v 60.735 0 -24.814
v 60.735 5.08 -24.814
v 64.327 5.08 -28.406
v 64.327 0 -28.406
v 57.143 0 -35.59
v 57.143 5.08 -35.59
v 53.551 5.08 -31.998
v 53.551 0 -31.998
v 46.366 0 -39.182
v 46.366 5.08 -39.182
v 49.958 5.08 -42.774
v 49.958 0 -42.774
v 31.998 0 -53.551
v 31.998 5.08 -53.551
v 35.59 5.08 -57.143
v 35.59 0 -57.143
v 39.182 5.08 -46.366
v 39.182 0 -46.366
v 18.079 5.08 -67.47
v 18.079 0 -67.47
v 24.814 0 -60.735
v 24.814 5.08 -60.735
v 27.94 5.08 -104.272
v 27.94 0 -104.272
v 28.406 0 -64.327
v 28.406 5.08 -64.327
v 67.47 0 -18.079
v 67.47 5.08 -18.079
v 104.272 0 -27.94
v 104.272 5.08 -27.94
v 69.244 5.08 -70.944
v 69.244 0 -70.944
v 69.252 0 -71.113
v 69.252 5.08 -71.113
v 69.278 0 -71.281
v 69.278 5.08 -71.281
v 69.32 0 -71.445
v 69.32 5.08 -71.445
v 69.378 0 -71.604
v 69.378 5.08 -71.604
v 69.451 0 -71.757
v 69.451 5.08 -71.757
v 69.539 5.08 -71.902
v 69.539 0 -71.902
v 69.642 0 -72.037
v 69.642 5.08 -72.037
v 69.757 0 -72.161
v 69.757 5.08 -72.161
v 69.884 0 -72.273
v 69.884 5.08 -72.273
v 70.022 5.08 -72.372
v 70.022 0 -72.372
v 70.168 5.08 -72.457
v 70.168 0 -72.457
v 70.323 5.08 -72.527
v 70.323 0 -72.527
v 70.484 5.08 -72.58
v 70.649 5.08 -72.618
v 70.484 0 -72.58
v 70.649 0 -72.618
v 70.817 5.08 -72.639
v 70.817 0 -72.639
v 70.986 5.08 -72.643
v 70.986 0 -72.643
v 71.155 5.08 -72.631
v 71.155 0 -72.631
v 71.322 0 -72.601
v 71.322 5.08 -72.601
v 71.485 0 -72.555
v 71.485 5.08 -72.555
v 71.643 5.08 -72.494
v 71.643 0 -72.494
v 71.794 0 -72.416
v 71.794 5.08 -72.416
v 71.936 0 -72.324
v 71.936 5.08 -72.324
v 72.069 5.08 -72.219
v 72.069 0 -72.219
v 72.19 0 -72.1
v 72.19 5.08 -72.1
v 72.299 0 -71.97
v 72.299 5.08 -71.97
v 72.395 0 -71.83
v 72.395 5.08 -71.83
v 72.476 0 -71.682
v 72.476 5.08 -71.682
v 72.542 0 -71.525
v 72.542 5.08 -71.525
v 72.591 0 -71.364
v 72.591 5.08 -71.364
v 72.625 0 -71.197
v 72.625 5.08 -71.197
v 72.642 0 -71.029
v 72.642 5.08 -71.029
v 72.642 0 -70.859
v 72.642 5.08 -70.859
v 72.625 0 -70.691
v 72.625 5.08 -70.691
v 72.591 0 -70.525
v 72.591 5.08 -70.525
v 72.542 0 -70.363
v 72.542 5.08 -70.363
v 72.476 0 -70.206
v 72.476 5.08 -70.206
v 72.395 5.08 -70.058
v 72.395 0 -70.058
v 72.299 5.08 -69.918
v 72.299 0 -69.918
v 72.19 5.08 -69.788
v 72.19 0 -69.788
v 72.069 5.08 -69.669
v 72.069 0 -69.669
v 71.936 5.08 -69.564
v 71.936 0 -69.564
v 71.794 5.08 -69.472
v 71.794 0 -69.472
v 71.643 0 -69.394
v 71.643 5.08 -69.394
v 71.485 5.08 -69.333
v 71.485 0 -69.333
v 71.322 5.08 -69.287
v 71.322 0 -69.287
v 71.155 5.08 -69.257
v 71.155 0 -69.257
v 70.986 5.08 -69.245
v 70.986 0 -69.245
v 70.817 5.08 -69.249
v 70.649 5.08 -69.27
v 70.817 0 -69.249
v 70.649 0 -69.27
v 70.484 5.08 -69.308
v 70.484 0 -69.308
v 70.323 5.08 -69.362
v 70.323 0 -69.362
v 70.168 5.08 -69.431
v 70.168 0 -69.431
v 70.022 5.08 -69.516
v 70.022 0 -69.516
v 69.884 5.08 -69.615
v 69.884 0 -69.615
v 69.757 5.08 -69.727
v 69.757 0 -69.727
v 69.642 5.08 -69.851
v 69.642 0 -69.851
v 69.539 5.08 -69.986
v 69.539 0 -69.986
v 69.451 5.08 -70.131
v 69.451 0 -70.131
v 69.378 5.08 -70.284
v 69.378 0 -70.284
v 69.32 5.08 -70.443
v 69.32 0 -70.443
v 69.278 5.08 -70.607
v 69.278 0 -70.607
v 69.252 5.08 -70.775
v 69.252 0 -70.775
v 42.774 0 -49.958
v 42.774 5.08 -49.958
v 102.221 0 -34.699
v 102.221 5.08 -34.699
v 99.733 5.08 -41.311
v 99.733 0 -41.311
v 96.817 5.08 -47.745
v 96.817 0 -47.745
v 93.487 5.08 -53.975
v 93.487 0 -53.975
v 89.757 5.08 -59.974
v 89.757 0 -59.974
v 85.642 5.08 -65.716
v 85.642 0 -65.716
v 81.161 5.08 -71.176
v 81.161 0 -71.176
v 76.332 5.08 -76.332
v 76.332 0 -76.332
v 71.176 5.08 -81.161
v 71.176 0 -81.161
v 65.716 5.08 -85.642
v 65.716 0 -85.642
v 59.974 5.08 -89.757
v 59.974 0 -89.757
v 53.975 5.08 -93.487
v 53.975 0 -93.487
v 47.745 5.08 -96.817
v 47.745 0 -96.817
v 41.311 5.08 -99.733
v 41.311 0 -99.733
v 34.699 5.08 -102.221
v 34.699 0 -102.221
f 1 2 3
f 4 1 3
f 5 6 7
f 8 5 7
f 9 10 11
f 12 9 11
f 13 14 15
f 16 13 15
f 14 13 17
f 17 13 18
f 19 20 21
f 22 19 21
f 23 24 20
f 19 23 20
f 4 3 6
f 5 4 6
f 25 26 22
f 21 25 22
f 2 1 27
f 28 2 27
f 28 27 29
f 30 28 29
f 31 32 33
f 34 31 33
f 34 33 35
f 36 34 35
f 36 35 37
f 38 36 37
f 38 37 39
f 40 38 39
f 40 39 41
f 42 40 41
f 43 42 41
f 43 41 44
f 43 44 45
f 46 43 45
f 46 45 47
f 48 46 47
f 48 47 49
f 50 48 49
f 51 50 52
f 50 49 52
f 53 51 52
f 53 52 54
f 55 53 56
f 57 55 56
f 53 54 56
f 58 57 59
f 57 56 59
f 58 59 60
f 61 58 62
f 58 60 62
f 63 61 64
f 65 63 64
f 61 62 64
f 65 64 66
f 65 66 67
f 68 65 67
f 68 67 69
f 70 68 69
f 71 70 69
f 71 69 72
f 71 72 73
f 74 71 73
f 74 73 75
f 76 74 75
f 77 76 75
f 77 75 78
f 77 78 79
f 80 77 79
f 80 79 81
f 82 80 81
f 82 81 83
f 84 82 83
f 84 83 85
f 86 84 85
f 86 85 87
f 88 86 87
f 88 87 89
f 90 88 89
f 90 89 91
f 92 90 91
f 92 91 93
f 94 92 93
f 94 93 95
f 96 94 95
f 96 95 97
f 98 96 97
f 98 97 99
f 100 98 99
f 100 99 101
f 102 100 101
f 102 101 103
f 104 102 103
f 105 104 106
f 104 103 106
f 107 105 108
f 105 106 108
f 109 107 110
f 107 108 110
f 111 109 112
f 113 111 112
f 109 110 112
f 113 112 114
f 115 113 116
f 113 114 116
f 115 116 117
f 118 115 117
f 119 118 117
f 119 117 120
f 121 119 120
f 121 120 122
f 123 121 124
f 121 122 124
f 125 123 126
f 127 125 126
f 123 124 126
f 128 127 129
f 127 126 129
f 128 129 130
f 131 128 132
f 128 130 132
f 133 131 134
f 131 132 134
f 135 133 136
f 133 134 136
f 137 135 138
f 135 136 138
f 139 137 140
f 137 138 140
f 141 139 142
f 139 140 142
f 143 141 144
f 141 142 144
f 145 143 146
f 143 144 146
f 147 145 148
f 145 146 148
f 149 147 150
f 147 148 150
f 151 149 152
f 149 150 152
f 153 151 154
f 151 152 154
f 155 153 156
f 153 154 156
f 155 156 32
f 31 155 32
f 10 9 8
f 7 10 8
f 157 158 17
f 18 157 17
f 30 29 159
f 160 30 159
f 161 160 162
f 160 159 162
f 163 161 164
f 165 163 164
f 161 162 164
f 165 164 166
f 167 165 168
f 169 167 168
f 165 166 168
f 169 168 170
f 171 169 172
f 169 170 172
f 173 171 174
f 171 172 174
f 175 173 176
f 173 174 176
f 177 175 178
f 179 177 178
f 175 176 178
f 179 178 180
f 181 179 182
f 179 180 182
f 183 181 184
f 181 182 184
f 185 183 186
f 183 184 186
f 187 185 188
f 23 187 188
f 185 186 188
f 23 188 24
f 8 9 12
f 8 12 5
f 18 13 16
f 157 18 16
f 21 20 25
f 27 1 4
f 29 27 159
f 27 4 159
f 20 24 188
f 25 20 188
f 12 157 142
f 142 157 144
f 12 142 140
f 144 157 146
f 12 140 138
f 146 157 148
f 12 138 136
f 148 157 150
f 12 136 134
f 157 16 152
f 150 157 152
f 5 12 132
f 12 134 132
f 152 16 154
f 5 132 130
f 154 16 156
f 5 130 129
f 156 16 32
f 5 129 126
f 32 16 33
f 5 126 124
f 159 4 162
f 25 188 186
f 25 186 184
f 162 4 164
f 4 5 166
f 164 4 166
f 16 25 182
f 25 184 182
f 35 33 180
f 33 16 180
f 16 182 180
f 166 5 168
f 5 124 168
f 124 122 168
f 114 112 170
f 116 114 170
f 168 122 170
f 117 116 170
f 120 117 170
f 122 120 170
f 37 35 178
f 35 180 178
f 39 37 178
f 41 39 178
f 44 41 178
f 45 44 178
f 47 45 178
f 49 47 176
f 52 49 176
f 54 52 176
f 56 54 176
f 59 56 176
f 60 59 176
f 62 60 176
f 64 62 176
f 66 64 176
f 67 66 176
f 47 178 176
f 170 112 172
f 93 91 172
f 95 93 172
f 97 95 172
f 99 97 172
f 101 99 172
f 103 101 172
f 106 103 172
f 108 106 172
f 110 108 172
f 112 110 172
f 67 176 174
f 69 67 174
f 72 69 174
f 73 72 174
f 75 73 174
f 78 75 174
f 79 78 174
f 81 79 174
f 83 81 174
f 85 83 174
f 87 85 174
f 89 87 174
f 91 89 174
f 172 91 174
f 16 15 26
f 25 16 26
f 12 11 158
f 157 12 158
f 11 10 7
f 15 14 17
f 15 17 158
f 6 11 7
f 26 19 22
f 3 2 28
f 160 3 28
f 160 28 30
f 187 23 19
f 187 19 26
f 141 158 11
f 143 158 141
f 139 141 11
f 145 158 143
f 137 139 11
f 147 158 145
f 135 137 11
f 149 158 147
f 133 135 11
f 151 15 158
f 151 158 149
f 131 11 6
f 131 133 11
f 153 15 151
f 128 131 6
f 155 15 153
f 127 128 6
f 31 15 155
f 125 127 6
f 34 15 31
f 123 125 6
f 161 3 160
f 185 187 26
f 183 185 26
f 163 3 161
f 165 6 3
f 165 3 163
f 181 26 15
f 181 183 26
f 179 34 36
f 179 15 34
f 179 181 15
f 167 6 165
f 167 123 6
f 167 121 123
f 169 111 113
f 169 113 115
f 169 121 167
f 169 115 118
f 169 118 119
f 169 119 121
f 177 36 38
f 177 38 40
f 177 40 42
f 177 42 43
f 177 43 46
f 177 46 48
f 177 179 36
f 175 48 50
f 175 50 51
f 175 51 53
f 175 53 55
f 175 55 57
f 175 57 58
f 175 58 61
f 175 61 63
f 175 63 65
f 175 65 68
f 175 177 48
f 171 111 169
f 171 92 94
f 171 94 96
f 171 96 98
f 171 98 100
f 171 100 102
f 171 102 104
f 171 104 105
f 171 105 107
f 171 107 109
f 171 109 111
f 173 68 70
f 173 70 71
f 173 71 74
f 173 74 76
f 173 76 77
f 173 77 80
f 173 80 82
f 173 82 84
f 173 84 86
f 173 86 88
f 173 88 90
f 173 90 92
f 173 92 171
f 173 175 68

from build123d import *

# Parameters (mm, degrees)
BOSS_EXTRUDE1_DEPTH      = 5.08
M3_CLEARANCE_HOLE1_D     = 3.4
M3_CLEARANCE_HOLE1_DEPTH = 11.938
M3_CLEARANCE_HOLE1_TIP   = 1.021463052
CUT_EXTRUDE1_REACH       = 7.08


with BuildPart() as part:
    # Sketch1 → Boss-Extrude1 (new body)
    with BuildSketch(Plane(origin=(0, 0, 0), x_dir=(1, 0, 0), z_dir=(0, 1, 0))):
        with BuildLine():
            Line((27.939515919, 104.271692948), (18.0785103, 67.469918966))
            Line((18.0785103, 67.469918966), (67.469918966, 18.0785103))
            Line((67.469918966, 18.0785103), (104.271692948, 27.939515919))
            ThreePointArc((104.271692948, 27.939515919), (76.332177029, 76.332177029), (27.939515919, 104.271692948))
        make_face()
    extrude(amount=BOSS_EXTRUDE1_DEPTH)

    # M3 Clearance Hole1
    with Locations(Plane(origin=(0, 5.08, 0), x_dir=(1, 0, 0), z_dir=(0, 1, 0))):
        with Locations((70.944023356, 70.944023356)):
            Hole(M3_CLEARANCE_HOLE1_D / 2, depth=M3_CLEARANCE_HOLE1_DEPTH)
            with Locations((0, 0, -(M3_CLEARANCE_HOLE1_DEPTH + M3_CLEARANCE_HOLE1_TIP / 2))):  # 118° drill point
                Cone(0, M3_CLEARANCE_HOLE1_D / 2, M3_CLEARANCE_HOLE1_TIP, mode=Mode.SUBTRACT)

    # Sketch5 → Cut-Extrude1 (cut, up to next)
    with BuildSketch(Plane(origin=(0, 5.08, 0), x_dir=(1, 0, 0), z_dir=(0, 1, 0)), mode=Mode.PRIVATE) as cut_extrude1_sk1:
        Polygon((64.326829324, 28.40580484), (57.142624427, 35.590009736), (53.550521979, 31.997907288), (60.734726875, 24.813702391), align=None)
    cut_extrude1_tool1 = extrude(cut_extrude1_sk1.sketch, amount=-CUT_EXTRUDE1_REACH, mode=Mode.PRIVATE) & part.part
    add(cut_extrude1_tool1.solids().sort_by_distance((58.938676, 5.08, -30.201856))[0], mode=Mode.SUBTRACT)
    # Sketch5 → Cut-Extrude1 (cut, up to next)
    with BuildSketch(Plane(origin=(0, 5.08, 0), x_dir=(1, 0, 0), z_dir=(0, 1, 0)), mode=Mode.PRIVATE) as cut_extrude1_sk2:
        Polygon((49.95841953, 42.774214633), (42.774214633, 49.95841953), (39.182112185, 46.366317082), (46.366317082, 39.182112185), align=None)
    cut_extrude1_tool2 = extrude(cut_extrude1_sk2.sketch, amount=-CUT_EXTRUDE1_REACH, mode=Mode.PRIVATE) & part.part
    add(cut_extrude1_tool2.solids().sort_by_distance((44.570266, 5.08, -44.570266))[0], mode=Mode.SUBTRACT)
    # Sketch5 → Cut-Extrude1 (cut, up to next)
    with BuildSketch(Plane(origin=(0, 5.08, 0), x_dir=(1, 0, 0), z_dir=(0, 1, 0)), mode=Mode.PRIVATE) as cut_extrude1_sk3:
        Polygon((24.813702391, 60.734726875), (31.997907288, 53.550521979), (35.590009736, 57.142624427), (28.40580484, 64.326829324), align=None)
    cut_extrude1_tool3 = extrude(cut_extrude1_sk3.sketch, amount=-CUT_EXTRUDE1_REACH, mode=Mode.PRIVATE) & part.part
    add(cut_extrude1_tool3.solids().sort_by_distance((30.201856, 5.08, -58.938676))[0], mode=Mode.SUBTRACT)


solid = part.part
